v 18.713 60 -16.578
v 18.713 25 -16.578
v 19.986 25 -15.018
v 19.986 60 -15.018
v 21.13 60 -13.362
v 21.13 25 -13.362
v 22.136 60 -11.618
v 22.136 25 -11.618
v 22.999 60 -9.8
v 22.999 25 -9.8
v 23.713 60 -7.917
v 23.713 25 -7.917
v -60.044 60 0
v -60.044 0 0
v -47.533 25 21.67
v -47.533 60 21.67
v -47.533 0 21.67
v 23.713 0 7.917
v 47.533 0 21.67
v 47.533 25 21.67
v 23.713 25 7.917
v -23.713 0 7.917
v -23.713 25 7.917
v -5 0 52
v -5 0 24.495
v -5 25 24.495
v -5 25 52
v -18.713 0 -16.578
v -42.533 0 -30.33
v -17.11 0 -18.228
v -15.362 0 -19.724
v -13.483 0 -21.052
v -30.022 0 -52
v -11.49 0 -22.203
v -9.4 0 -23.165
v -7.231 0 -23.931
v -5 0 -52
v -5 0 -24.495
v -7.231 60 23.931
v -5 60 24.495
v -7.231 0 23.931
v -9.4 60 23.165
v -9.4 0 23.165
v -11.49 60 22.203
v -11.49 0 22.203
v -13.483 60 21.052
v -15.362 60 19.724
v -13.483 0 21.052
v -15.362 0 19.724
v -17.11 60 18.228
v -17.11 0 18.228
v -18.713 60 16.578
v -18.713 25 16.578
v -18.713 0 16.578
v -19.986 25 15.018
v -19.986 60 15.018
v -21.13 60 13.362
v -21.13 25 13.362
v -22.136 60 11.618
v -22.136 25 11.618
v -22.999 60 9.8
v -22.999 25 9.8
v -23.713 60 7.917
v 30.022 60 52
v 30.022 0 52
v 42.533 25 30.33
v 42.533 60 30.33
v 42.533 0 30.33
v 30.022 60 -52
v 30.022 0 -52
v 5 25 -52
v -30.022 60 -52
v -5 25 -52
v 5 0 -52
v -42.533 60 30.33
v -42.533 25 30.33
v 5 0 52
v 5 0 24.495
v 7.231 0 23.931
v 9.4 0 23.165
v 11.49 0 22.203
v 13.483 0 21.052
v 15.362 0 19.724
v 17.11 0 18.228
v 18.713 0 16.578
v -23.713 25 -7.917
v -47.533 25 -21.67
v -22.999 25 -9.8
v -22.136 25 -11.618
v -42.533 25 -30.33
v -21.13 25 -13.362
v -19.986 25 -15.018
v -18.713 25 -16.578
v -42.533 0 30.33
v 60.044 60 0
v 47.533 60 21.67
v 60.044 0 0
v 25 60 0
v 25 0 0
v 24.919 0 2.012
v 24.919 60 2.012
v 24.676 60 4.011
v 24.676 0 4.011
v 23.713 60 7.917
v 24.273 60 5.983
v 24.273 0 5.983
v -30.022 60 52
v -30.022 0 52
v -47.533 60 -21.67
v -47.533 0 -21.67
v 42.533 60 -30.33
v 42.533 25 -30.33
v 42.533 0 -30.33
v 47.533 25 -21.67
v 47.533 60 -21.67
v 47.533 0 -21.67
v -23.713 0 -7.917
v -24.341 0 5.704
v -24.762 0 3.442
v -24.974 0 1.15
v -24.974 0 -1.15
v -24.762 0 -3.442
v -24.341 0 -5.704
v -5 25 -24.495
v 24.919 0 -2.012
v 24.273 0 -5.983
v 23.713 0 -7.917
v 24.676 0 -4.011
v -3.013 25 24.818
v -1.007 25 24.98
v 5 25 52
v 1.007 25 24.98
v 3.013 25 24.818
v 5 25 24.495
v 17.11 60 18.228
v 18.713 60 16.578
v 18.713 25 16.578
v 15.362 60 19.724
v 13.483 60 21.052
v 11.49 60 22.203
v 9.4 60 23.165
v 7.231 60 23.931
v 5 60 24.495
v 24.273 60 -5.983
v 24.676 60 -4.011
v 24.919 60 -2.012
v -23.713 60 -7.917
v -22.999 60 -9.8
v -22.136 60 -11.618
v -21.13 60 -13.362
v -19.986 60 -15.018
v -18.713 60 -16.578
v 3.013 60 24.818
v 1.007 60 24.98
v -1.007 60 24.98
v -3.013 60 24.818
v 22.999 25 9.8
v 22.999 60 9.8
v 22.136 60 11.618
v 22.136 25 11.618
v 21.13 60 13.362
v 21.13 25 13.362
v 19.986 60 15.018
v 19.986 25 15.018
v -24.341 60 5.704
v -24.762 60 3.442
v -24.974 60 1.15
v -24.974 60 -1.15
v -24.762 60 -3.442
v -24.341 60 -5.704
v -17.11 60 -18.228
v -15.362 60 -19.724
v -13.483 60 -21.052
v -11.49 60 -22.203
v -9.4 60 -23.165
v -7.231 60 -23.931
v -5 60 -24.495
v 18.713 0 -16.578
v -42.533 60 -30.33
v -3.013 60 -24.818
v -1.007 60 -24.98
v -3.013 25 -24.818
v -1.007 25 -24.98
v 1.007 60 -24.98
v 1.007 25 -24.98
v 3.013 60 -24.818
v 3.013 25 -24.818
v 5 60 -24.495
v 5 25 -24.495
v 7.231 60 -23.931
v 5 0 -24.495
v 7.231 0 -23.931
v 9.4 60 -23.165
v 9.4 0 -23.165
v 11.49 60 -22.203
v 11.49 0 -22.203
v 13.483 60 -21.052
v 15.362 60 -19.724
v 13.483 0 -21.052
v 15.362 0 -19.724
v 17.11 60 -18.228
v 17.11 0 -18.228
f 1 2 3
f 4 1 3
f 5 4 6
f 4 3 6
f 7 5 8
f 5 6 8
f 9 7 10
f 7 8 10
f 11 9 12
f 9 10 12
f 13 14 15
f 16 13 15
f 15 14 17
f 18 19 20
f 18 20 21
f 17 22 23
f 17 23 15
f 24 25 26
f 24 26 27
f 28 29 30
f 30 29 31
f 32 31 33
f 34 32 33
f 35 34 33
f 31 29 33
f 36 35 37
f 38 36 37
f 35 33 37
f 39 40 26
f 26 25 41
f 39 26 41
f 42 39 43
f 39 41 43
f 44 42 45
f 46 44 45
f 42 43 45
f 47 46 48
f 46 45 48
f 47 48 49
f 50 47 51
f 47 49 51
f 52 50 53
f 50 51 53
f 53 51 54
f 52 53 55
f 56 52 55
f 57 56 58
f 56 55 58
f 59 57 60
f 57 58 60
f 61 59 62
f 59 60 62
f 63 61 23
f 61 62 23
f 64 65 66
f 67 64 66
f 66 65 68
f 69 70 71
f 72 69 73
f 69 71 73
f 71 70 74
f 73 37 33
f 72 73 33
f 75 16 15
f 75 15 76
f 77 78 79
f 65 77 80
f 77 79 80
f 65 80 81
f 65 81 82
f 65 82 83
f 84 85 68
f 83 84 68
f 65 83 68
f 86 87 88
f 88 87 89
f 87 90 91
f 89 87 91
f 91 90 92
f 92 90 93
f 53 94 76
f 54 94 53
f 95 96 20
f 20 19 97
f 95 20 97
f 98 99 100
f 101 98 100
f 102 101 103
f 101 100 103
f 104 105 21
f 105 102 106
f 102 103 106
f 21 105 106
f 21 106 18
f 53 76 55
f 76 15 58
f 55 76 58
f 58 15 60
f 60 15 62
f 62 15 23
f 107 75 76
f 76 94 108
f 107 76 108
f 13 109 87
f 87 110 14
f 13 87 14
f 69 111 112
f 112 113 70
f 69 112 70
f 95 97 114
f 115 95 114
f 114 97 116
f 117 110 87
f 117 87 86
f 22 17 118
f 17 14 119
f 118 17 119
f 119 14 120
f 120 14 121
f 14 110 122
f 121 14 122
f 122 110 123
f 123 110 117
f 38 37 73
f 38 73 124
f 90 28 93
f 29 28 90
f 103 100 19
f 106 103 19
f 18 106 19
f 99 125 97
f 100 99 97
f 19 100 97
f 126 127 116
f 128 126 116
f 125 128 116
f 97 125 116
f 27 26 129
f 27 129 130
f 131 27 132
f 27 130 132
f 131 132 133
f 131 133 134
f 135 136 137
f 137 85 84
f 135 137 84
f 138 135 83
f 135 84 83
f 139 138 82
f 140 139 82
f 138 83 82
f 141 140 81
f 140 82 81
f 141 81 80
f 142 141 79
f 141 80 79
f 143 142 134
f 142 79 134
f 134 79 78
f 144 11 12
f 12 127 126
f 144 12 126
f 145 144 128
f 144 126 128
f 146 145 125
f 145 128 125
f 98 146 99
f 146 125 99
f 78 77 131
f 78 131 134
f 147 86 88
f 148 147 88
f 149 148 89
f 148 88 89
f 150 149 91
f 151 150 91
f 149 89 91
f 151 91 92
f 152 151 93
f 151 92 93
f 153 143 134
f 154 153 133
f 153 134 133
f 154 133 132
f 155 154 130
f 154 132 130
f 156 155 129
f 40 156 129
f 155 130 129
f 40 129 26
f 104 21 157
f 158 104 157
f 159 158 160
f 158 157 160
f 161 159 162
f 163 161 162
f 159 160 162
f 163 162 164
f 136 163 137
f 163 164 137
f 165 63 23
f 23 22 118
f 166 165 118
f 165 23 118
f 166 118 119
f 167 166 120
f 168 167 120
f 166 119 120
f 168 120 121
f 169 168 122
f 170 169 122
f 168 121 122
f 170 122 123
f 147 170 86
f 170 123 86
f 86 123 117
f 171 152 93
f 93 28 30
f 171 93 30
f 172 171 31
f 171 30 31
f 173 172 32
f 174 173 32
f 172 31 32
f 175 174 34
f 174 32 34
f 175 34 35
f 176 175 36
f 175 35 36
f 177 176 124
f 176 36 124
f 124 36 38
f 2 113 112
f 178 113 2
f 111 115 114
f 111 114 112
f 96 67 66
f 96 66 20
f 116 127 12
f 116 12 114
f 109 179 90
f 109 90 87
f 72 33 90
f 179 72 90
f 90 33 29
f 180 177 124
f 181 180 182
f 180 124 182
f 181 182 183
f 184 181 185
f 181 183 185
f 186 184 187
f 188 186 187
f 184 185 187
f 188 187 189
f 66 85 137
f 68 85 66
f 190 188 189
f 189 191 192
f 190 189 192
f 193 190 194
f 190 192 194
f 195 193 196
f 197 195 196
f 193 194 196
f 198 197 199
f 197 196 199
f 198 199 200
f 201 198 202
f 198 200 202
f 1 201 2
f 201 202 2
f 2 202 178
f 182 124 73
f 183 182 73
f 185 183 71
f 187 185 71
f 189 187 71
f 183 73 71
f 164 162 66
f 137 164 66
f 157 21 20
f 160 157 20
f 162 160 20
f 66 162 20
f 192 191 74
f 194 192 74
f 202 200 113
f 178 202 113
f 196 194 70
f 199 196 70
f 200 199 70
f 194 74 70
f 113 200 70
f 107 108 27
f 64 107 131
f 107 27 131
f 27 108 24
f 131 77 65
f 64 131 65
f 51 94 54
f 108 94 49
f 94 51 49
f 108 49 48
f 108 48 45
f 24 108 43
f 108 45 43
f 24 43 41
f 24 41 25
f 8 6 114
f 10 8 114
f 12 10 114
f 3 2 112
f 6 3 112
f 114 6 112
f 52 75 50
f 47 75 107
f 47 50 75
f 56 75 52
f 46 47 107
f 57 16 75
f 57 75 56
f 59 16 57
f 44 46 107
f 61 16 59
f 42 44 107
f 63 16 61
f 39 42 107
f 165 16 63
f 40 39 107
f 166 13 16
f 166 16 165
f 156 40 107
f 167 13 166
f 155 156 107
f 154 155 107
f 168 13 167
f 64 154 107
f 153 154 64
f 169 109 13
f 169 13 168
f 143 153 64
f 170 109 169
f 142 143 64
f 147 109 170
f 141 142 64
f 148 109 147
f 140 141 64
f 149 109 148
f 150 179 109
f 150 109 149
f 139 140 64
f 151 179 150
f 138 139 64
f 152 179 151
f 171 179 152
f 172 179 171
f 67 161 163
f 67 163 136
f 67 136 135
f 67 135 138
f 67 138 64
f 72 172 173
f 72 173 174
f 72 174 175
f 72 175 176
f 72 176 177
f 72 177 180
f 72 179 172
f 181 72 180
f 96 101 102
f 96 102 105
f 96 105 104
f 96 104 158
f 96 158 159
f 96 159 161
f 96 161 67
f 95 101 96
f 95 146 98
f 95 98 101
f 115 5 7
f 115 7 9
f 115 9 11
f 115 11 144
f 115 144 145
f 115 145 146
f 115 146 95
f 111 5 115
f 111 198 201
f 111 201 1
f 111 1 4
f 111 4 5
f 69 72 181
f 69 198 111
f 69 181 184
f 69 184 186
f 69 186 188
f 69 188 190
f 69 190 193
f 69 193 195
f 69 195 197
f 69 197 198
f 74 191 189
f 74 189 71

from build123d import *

# Parameters (mm, degrees)
SKETCH1_R           = 25
BOSS_EXTRUDE1_DEPTH = 60
CUT_EXTRUDE1_DEPTH  = 25


with BuildPart() as part:
    # Sketch1 → Boss-Extrude1 (new body)
    with BuildSketch(Plane(origin=(0, 0, 0), x_dir=(1, 0, 0), z_dir=(0, 1, 0))):
        Polygon((30.022213998, -52), (60.044427996, 0), (30.022213998, 52), (-30.022213998, 52), (-60.044427996, 0), (-30.022213998, -52), align=None)
        Circle(SKETCH1_R, mode=Mode.SUBTRACT)
    extrude(amount=BOSS_EXTRUDE1_DEPTH)

    # Sketch1<4> → Cut-Extrude1 (cut)
    with BuildSketch(Plane(origin=(0, 0, 0), x_dir=(1, 0, 0), z_dir=(0, 1, 0))):
        with BuildLine():
            Line((18.713203436, -16.577575733), (42.533320997, -30.330127019))
            Line((42.533320997, -30.330127019), (47.533320997, -21.669872981))
            Line((47.533320997, -21.669872981), (23.713203436, -7.917321695))
            ThreePointArc((23.713203436, -7.917321695), (21.650635095, -12.5), (18.713203436, -16.577575733))
        make_face()
        with BuildLine():
            Line((-5, -52), (5, -52))
            Line((5, -52), (5, -24.494897428))
            ThreePointArc((5, -24.494897428), (0, -25), (-5, -24.494897428))
            Line((-5, -24.494897428), (-5, -52))
        make_face()
        with BuildLine():
            Line((23.713203436, 7.917321695), (47.533320997, 21.669872981))
            Line((47.533320997, 21.669872981), (42.533320997, 30.330127019))
            Line((42.533320997, 30.330127019), (18.713203436, 16.577575733))
            ThreePointArc((18.713203436, 16.577575733), (21.650635095, 12.5), (23.713203436, 7.917321695))
        make_face()
        with BuildLine():
            Line((-47.533320997, -21.669872981), (-42.533320997, -30.330127019))
            Line((-42.533320997, -30.330127019), (-18.713203436, -16.577575733))
            ThreePointArc((-18.713203436, -16.577575733), (-21.650635095, -12.5), (-23.713203436, -7.917321695))
            Line((-23.713203436, -7.917321695), (-47.533320997, -21.669872981))
        make_face()
        with BuildLine():
            Line((-47.533320997, 21.669872981), (-23.713203436, 7.917321695))
            ThreePointArc((-23.713203436, 7.917321695), (-21.650635095, 12.5), (-18.713203436, 16.577575733))
            Line((-18.713203436, 16.577575733), (-42.533320997, 30.330127019))
            Line((-42.533320997, 30.330127019), (-47.533320997, 21.669872981))
        make_face()
        with BuildLine():
            Line((5, 24.494897428), (5, 52))
            Line((5, 52), (-5, 52))
            Line((-5, 52), (-5, 24.494897428))
            ThreePointArc((-5, 24.494897428), (0, 25), (5, 24.494897428))
        make_face()
    extrude(amount=CUT_EXTRUDE1_DEPTH, mode=Mode.SUBTRACT)


solid = part.part
